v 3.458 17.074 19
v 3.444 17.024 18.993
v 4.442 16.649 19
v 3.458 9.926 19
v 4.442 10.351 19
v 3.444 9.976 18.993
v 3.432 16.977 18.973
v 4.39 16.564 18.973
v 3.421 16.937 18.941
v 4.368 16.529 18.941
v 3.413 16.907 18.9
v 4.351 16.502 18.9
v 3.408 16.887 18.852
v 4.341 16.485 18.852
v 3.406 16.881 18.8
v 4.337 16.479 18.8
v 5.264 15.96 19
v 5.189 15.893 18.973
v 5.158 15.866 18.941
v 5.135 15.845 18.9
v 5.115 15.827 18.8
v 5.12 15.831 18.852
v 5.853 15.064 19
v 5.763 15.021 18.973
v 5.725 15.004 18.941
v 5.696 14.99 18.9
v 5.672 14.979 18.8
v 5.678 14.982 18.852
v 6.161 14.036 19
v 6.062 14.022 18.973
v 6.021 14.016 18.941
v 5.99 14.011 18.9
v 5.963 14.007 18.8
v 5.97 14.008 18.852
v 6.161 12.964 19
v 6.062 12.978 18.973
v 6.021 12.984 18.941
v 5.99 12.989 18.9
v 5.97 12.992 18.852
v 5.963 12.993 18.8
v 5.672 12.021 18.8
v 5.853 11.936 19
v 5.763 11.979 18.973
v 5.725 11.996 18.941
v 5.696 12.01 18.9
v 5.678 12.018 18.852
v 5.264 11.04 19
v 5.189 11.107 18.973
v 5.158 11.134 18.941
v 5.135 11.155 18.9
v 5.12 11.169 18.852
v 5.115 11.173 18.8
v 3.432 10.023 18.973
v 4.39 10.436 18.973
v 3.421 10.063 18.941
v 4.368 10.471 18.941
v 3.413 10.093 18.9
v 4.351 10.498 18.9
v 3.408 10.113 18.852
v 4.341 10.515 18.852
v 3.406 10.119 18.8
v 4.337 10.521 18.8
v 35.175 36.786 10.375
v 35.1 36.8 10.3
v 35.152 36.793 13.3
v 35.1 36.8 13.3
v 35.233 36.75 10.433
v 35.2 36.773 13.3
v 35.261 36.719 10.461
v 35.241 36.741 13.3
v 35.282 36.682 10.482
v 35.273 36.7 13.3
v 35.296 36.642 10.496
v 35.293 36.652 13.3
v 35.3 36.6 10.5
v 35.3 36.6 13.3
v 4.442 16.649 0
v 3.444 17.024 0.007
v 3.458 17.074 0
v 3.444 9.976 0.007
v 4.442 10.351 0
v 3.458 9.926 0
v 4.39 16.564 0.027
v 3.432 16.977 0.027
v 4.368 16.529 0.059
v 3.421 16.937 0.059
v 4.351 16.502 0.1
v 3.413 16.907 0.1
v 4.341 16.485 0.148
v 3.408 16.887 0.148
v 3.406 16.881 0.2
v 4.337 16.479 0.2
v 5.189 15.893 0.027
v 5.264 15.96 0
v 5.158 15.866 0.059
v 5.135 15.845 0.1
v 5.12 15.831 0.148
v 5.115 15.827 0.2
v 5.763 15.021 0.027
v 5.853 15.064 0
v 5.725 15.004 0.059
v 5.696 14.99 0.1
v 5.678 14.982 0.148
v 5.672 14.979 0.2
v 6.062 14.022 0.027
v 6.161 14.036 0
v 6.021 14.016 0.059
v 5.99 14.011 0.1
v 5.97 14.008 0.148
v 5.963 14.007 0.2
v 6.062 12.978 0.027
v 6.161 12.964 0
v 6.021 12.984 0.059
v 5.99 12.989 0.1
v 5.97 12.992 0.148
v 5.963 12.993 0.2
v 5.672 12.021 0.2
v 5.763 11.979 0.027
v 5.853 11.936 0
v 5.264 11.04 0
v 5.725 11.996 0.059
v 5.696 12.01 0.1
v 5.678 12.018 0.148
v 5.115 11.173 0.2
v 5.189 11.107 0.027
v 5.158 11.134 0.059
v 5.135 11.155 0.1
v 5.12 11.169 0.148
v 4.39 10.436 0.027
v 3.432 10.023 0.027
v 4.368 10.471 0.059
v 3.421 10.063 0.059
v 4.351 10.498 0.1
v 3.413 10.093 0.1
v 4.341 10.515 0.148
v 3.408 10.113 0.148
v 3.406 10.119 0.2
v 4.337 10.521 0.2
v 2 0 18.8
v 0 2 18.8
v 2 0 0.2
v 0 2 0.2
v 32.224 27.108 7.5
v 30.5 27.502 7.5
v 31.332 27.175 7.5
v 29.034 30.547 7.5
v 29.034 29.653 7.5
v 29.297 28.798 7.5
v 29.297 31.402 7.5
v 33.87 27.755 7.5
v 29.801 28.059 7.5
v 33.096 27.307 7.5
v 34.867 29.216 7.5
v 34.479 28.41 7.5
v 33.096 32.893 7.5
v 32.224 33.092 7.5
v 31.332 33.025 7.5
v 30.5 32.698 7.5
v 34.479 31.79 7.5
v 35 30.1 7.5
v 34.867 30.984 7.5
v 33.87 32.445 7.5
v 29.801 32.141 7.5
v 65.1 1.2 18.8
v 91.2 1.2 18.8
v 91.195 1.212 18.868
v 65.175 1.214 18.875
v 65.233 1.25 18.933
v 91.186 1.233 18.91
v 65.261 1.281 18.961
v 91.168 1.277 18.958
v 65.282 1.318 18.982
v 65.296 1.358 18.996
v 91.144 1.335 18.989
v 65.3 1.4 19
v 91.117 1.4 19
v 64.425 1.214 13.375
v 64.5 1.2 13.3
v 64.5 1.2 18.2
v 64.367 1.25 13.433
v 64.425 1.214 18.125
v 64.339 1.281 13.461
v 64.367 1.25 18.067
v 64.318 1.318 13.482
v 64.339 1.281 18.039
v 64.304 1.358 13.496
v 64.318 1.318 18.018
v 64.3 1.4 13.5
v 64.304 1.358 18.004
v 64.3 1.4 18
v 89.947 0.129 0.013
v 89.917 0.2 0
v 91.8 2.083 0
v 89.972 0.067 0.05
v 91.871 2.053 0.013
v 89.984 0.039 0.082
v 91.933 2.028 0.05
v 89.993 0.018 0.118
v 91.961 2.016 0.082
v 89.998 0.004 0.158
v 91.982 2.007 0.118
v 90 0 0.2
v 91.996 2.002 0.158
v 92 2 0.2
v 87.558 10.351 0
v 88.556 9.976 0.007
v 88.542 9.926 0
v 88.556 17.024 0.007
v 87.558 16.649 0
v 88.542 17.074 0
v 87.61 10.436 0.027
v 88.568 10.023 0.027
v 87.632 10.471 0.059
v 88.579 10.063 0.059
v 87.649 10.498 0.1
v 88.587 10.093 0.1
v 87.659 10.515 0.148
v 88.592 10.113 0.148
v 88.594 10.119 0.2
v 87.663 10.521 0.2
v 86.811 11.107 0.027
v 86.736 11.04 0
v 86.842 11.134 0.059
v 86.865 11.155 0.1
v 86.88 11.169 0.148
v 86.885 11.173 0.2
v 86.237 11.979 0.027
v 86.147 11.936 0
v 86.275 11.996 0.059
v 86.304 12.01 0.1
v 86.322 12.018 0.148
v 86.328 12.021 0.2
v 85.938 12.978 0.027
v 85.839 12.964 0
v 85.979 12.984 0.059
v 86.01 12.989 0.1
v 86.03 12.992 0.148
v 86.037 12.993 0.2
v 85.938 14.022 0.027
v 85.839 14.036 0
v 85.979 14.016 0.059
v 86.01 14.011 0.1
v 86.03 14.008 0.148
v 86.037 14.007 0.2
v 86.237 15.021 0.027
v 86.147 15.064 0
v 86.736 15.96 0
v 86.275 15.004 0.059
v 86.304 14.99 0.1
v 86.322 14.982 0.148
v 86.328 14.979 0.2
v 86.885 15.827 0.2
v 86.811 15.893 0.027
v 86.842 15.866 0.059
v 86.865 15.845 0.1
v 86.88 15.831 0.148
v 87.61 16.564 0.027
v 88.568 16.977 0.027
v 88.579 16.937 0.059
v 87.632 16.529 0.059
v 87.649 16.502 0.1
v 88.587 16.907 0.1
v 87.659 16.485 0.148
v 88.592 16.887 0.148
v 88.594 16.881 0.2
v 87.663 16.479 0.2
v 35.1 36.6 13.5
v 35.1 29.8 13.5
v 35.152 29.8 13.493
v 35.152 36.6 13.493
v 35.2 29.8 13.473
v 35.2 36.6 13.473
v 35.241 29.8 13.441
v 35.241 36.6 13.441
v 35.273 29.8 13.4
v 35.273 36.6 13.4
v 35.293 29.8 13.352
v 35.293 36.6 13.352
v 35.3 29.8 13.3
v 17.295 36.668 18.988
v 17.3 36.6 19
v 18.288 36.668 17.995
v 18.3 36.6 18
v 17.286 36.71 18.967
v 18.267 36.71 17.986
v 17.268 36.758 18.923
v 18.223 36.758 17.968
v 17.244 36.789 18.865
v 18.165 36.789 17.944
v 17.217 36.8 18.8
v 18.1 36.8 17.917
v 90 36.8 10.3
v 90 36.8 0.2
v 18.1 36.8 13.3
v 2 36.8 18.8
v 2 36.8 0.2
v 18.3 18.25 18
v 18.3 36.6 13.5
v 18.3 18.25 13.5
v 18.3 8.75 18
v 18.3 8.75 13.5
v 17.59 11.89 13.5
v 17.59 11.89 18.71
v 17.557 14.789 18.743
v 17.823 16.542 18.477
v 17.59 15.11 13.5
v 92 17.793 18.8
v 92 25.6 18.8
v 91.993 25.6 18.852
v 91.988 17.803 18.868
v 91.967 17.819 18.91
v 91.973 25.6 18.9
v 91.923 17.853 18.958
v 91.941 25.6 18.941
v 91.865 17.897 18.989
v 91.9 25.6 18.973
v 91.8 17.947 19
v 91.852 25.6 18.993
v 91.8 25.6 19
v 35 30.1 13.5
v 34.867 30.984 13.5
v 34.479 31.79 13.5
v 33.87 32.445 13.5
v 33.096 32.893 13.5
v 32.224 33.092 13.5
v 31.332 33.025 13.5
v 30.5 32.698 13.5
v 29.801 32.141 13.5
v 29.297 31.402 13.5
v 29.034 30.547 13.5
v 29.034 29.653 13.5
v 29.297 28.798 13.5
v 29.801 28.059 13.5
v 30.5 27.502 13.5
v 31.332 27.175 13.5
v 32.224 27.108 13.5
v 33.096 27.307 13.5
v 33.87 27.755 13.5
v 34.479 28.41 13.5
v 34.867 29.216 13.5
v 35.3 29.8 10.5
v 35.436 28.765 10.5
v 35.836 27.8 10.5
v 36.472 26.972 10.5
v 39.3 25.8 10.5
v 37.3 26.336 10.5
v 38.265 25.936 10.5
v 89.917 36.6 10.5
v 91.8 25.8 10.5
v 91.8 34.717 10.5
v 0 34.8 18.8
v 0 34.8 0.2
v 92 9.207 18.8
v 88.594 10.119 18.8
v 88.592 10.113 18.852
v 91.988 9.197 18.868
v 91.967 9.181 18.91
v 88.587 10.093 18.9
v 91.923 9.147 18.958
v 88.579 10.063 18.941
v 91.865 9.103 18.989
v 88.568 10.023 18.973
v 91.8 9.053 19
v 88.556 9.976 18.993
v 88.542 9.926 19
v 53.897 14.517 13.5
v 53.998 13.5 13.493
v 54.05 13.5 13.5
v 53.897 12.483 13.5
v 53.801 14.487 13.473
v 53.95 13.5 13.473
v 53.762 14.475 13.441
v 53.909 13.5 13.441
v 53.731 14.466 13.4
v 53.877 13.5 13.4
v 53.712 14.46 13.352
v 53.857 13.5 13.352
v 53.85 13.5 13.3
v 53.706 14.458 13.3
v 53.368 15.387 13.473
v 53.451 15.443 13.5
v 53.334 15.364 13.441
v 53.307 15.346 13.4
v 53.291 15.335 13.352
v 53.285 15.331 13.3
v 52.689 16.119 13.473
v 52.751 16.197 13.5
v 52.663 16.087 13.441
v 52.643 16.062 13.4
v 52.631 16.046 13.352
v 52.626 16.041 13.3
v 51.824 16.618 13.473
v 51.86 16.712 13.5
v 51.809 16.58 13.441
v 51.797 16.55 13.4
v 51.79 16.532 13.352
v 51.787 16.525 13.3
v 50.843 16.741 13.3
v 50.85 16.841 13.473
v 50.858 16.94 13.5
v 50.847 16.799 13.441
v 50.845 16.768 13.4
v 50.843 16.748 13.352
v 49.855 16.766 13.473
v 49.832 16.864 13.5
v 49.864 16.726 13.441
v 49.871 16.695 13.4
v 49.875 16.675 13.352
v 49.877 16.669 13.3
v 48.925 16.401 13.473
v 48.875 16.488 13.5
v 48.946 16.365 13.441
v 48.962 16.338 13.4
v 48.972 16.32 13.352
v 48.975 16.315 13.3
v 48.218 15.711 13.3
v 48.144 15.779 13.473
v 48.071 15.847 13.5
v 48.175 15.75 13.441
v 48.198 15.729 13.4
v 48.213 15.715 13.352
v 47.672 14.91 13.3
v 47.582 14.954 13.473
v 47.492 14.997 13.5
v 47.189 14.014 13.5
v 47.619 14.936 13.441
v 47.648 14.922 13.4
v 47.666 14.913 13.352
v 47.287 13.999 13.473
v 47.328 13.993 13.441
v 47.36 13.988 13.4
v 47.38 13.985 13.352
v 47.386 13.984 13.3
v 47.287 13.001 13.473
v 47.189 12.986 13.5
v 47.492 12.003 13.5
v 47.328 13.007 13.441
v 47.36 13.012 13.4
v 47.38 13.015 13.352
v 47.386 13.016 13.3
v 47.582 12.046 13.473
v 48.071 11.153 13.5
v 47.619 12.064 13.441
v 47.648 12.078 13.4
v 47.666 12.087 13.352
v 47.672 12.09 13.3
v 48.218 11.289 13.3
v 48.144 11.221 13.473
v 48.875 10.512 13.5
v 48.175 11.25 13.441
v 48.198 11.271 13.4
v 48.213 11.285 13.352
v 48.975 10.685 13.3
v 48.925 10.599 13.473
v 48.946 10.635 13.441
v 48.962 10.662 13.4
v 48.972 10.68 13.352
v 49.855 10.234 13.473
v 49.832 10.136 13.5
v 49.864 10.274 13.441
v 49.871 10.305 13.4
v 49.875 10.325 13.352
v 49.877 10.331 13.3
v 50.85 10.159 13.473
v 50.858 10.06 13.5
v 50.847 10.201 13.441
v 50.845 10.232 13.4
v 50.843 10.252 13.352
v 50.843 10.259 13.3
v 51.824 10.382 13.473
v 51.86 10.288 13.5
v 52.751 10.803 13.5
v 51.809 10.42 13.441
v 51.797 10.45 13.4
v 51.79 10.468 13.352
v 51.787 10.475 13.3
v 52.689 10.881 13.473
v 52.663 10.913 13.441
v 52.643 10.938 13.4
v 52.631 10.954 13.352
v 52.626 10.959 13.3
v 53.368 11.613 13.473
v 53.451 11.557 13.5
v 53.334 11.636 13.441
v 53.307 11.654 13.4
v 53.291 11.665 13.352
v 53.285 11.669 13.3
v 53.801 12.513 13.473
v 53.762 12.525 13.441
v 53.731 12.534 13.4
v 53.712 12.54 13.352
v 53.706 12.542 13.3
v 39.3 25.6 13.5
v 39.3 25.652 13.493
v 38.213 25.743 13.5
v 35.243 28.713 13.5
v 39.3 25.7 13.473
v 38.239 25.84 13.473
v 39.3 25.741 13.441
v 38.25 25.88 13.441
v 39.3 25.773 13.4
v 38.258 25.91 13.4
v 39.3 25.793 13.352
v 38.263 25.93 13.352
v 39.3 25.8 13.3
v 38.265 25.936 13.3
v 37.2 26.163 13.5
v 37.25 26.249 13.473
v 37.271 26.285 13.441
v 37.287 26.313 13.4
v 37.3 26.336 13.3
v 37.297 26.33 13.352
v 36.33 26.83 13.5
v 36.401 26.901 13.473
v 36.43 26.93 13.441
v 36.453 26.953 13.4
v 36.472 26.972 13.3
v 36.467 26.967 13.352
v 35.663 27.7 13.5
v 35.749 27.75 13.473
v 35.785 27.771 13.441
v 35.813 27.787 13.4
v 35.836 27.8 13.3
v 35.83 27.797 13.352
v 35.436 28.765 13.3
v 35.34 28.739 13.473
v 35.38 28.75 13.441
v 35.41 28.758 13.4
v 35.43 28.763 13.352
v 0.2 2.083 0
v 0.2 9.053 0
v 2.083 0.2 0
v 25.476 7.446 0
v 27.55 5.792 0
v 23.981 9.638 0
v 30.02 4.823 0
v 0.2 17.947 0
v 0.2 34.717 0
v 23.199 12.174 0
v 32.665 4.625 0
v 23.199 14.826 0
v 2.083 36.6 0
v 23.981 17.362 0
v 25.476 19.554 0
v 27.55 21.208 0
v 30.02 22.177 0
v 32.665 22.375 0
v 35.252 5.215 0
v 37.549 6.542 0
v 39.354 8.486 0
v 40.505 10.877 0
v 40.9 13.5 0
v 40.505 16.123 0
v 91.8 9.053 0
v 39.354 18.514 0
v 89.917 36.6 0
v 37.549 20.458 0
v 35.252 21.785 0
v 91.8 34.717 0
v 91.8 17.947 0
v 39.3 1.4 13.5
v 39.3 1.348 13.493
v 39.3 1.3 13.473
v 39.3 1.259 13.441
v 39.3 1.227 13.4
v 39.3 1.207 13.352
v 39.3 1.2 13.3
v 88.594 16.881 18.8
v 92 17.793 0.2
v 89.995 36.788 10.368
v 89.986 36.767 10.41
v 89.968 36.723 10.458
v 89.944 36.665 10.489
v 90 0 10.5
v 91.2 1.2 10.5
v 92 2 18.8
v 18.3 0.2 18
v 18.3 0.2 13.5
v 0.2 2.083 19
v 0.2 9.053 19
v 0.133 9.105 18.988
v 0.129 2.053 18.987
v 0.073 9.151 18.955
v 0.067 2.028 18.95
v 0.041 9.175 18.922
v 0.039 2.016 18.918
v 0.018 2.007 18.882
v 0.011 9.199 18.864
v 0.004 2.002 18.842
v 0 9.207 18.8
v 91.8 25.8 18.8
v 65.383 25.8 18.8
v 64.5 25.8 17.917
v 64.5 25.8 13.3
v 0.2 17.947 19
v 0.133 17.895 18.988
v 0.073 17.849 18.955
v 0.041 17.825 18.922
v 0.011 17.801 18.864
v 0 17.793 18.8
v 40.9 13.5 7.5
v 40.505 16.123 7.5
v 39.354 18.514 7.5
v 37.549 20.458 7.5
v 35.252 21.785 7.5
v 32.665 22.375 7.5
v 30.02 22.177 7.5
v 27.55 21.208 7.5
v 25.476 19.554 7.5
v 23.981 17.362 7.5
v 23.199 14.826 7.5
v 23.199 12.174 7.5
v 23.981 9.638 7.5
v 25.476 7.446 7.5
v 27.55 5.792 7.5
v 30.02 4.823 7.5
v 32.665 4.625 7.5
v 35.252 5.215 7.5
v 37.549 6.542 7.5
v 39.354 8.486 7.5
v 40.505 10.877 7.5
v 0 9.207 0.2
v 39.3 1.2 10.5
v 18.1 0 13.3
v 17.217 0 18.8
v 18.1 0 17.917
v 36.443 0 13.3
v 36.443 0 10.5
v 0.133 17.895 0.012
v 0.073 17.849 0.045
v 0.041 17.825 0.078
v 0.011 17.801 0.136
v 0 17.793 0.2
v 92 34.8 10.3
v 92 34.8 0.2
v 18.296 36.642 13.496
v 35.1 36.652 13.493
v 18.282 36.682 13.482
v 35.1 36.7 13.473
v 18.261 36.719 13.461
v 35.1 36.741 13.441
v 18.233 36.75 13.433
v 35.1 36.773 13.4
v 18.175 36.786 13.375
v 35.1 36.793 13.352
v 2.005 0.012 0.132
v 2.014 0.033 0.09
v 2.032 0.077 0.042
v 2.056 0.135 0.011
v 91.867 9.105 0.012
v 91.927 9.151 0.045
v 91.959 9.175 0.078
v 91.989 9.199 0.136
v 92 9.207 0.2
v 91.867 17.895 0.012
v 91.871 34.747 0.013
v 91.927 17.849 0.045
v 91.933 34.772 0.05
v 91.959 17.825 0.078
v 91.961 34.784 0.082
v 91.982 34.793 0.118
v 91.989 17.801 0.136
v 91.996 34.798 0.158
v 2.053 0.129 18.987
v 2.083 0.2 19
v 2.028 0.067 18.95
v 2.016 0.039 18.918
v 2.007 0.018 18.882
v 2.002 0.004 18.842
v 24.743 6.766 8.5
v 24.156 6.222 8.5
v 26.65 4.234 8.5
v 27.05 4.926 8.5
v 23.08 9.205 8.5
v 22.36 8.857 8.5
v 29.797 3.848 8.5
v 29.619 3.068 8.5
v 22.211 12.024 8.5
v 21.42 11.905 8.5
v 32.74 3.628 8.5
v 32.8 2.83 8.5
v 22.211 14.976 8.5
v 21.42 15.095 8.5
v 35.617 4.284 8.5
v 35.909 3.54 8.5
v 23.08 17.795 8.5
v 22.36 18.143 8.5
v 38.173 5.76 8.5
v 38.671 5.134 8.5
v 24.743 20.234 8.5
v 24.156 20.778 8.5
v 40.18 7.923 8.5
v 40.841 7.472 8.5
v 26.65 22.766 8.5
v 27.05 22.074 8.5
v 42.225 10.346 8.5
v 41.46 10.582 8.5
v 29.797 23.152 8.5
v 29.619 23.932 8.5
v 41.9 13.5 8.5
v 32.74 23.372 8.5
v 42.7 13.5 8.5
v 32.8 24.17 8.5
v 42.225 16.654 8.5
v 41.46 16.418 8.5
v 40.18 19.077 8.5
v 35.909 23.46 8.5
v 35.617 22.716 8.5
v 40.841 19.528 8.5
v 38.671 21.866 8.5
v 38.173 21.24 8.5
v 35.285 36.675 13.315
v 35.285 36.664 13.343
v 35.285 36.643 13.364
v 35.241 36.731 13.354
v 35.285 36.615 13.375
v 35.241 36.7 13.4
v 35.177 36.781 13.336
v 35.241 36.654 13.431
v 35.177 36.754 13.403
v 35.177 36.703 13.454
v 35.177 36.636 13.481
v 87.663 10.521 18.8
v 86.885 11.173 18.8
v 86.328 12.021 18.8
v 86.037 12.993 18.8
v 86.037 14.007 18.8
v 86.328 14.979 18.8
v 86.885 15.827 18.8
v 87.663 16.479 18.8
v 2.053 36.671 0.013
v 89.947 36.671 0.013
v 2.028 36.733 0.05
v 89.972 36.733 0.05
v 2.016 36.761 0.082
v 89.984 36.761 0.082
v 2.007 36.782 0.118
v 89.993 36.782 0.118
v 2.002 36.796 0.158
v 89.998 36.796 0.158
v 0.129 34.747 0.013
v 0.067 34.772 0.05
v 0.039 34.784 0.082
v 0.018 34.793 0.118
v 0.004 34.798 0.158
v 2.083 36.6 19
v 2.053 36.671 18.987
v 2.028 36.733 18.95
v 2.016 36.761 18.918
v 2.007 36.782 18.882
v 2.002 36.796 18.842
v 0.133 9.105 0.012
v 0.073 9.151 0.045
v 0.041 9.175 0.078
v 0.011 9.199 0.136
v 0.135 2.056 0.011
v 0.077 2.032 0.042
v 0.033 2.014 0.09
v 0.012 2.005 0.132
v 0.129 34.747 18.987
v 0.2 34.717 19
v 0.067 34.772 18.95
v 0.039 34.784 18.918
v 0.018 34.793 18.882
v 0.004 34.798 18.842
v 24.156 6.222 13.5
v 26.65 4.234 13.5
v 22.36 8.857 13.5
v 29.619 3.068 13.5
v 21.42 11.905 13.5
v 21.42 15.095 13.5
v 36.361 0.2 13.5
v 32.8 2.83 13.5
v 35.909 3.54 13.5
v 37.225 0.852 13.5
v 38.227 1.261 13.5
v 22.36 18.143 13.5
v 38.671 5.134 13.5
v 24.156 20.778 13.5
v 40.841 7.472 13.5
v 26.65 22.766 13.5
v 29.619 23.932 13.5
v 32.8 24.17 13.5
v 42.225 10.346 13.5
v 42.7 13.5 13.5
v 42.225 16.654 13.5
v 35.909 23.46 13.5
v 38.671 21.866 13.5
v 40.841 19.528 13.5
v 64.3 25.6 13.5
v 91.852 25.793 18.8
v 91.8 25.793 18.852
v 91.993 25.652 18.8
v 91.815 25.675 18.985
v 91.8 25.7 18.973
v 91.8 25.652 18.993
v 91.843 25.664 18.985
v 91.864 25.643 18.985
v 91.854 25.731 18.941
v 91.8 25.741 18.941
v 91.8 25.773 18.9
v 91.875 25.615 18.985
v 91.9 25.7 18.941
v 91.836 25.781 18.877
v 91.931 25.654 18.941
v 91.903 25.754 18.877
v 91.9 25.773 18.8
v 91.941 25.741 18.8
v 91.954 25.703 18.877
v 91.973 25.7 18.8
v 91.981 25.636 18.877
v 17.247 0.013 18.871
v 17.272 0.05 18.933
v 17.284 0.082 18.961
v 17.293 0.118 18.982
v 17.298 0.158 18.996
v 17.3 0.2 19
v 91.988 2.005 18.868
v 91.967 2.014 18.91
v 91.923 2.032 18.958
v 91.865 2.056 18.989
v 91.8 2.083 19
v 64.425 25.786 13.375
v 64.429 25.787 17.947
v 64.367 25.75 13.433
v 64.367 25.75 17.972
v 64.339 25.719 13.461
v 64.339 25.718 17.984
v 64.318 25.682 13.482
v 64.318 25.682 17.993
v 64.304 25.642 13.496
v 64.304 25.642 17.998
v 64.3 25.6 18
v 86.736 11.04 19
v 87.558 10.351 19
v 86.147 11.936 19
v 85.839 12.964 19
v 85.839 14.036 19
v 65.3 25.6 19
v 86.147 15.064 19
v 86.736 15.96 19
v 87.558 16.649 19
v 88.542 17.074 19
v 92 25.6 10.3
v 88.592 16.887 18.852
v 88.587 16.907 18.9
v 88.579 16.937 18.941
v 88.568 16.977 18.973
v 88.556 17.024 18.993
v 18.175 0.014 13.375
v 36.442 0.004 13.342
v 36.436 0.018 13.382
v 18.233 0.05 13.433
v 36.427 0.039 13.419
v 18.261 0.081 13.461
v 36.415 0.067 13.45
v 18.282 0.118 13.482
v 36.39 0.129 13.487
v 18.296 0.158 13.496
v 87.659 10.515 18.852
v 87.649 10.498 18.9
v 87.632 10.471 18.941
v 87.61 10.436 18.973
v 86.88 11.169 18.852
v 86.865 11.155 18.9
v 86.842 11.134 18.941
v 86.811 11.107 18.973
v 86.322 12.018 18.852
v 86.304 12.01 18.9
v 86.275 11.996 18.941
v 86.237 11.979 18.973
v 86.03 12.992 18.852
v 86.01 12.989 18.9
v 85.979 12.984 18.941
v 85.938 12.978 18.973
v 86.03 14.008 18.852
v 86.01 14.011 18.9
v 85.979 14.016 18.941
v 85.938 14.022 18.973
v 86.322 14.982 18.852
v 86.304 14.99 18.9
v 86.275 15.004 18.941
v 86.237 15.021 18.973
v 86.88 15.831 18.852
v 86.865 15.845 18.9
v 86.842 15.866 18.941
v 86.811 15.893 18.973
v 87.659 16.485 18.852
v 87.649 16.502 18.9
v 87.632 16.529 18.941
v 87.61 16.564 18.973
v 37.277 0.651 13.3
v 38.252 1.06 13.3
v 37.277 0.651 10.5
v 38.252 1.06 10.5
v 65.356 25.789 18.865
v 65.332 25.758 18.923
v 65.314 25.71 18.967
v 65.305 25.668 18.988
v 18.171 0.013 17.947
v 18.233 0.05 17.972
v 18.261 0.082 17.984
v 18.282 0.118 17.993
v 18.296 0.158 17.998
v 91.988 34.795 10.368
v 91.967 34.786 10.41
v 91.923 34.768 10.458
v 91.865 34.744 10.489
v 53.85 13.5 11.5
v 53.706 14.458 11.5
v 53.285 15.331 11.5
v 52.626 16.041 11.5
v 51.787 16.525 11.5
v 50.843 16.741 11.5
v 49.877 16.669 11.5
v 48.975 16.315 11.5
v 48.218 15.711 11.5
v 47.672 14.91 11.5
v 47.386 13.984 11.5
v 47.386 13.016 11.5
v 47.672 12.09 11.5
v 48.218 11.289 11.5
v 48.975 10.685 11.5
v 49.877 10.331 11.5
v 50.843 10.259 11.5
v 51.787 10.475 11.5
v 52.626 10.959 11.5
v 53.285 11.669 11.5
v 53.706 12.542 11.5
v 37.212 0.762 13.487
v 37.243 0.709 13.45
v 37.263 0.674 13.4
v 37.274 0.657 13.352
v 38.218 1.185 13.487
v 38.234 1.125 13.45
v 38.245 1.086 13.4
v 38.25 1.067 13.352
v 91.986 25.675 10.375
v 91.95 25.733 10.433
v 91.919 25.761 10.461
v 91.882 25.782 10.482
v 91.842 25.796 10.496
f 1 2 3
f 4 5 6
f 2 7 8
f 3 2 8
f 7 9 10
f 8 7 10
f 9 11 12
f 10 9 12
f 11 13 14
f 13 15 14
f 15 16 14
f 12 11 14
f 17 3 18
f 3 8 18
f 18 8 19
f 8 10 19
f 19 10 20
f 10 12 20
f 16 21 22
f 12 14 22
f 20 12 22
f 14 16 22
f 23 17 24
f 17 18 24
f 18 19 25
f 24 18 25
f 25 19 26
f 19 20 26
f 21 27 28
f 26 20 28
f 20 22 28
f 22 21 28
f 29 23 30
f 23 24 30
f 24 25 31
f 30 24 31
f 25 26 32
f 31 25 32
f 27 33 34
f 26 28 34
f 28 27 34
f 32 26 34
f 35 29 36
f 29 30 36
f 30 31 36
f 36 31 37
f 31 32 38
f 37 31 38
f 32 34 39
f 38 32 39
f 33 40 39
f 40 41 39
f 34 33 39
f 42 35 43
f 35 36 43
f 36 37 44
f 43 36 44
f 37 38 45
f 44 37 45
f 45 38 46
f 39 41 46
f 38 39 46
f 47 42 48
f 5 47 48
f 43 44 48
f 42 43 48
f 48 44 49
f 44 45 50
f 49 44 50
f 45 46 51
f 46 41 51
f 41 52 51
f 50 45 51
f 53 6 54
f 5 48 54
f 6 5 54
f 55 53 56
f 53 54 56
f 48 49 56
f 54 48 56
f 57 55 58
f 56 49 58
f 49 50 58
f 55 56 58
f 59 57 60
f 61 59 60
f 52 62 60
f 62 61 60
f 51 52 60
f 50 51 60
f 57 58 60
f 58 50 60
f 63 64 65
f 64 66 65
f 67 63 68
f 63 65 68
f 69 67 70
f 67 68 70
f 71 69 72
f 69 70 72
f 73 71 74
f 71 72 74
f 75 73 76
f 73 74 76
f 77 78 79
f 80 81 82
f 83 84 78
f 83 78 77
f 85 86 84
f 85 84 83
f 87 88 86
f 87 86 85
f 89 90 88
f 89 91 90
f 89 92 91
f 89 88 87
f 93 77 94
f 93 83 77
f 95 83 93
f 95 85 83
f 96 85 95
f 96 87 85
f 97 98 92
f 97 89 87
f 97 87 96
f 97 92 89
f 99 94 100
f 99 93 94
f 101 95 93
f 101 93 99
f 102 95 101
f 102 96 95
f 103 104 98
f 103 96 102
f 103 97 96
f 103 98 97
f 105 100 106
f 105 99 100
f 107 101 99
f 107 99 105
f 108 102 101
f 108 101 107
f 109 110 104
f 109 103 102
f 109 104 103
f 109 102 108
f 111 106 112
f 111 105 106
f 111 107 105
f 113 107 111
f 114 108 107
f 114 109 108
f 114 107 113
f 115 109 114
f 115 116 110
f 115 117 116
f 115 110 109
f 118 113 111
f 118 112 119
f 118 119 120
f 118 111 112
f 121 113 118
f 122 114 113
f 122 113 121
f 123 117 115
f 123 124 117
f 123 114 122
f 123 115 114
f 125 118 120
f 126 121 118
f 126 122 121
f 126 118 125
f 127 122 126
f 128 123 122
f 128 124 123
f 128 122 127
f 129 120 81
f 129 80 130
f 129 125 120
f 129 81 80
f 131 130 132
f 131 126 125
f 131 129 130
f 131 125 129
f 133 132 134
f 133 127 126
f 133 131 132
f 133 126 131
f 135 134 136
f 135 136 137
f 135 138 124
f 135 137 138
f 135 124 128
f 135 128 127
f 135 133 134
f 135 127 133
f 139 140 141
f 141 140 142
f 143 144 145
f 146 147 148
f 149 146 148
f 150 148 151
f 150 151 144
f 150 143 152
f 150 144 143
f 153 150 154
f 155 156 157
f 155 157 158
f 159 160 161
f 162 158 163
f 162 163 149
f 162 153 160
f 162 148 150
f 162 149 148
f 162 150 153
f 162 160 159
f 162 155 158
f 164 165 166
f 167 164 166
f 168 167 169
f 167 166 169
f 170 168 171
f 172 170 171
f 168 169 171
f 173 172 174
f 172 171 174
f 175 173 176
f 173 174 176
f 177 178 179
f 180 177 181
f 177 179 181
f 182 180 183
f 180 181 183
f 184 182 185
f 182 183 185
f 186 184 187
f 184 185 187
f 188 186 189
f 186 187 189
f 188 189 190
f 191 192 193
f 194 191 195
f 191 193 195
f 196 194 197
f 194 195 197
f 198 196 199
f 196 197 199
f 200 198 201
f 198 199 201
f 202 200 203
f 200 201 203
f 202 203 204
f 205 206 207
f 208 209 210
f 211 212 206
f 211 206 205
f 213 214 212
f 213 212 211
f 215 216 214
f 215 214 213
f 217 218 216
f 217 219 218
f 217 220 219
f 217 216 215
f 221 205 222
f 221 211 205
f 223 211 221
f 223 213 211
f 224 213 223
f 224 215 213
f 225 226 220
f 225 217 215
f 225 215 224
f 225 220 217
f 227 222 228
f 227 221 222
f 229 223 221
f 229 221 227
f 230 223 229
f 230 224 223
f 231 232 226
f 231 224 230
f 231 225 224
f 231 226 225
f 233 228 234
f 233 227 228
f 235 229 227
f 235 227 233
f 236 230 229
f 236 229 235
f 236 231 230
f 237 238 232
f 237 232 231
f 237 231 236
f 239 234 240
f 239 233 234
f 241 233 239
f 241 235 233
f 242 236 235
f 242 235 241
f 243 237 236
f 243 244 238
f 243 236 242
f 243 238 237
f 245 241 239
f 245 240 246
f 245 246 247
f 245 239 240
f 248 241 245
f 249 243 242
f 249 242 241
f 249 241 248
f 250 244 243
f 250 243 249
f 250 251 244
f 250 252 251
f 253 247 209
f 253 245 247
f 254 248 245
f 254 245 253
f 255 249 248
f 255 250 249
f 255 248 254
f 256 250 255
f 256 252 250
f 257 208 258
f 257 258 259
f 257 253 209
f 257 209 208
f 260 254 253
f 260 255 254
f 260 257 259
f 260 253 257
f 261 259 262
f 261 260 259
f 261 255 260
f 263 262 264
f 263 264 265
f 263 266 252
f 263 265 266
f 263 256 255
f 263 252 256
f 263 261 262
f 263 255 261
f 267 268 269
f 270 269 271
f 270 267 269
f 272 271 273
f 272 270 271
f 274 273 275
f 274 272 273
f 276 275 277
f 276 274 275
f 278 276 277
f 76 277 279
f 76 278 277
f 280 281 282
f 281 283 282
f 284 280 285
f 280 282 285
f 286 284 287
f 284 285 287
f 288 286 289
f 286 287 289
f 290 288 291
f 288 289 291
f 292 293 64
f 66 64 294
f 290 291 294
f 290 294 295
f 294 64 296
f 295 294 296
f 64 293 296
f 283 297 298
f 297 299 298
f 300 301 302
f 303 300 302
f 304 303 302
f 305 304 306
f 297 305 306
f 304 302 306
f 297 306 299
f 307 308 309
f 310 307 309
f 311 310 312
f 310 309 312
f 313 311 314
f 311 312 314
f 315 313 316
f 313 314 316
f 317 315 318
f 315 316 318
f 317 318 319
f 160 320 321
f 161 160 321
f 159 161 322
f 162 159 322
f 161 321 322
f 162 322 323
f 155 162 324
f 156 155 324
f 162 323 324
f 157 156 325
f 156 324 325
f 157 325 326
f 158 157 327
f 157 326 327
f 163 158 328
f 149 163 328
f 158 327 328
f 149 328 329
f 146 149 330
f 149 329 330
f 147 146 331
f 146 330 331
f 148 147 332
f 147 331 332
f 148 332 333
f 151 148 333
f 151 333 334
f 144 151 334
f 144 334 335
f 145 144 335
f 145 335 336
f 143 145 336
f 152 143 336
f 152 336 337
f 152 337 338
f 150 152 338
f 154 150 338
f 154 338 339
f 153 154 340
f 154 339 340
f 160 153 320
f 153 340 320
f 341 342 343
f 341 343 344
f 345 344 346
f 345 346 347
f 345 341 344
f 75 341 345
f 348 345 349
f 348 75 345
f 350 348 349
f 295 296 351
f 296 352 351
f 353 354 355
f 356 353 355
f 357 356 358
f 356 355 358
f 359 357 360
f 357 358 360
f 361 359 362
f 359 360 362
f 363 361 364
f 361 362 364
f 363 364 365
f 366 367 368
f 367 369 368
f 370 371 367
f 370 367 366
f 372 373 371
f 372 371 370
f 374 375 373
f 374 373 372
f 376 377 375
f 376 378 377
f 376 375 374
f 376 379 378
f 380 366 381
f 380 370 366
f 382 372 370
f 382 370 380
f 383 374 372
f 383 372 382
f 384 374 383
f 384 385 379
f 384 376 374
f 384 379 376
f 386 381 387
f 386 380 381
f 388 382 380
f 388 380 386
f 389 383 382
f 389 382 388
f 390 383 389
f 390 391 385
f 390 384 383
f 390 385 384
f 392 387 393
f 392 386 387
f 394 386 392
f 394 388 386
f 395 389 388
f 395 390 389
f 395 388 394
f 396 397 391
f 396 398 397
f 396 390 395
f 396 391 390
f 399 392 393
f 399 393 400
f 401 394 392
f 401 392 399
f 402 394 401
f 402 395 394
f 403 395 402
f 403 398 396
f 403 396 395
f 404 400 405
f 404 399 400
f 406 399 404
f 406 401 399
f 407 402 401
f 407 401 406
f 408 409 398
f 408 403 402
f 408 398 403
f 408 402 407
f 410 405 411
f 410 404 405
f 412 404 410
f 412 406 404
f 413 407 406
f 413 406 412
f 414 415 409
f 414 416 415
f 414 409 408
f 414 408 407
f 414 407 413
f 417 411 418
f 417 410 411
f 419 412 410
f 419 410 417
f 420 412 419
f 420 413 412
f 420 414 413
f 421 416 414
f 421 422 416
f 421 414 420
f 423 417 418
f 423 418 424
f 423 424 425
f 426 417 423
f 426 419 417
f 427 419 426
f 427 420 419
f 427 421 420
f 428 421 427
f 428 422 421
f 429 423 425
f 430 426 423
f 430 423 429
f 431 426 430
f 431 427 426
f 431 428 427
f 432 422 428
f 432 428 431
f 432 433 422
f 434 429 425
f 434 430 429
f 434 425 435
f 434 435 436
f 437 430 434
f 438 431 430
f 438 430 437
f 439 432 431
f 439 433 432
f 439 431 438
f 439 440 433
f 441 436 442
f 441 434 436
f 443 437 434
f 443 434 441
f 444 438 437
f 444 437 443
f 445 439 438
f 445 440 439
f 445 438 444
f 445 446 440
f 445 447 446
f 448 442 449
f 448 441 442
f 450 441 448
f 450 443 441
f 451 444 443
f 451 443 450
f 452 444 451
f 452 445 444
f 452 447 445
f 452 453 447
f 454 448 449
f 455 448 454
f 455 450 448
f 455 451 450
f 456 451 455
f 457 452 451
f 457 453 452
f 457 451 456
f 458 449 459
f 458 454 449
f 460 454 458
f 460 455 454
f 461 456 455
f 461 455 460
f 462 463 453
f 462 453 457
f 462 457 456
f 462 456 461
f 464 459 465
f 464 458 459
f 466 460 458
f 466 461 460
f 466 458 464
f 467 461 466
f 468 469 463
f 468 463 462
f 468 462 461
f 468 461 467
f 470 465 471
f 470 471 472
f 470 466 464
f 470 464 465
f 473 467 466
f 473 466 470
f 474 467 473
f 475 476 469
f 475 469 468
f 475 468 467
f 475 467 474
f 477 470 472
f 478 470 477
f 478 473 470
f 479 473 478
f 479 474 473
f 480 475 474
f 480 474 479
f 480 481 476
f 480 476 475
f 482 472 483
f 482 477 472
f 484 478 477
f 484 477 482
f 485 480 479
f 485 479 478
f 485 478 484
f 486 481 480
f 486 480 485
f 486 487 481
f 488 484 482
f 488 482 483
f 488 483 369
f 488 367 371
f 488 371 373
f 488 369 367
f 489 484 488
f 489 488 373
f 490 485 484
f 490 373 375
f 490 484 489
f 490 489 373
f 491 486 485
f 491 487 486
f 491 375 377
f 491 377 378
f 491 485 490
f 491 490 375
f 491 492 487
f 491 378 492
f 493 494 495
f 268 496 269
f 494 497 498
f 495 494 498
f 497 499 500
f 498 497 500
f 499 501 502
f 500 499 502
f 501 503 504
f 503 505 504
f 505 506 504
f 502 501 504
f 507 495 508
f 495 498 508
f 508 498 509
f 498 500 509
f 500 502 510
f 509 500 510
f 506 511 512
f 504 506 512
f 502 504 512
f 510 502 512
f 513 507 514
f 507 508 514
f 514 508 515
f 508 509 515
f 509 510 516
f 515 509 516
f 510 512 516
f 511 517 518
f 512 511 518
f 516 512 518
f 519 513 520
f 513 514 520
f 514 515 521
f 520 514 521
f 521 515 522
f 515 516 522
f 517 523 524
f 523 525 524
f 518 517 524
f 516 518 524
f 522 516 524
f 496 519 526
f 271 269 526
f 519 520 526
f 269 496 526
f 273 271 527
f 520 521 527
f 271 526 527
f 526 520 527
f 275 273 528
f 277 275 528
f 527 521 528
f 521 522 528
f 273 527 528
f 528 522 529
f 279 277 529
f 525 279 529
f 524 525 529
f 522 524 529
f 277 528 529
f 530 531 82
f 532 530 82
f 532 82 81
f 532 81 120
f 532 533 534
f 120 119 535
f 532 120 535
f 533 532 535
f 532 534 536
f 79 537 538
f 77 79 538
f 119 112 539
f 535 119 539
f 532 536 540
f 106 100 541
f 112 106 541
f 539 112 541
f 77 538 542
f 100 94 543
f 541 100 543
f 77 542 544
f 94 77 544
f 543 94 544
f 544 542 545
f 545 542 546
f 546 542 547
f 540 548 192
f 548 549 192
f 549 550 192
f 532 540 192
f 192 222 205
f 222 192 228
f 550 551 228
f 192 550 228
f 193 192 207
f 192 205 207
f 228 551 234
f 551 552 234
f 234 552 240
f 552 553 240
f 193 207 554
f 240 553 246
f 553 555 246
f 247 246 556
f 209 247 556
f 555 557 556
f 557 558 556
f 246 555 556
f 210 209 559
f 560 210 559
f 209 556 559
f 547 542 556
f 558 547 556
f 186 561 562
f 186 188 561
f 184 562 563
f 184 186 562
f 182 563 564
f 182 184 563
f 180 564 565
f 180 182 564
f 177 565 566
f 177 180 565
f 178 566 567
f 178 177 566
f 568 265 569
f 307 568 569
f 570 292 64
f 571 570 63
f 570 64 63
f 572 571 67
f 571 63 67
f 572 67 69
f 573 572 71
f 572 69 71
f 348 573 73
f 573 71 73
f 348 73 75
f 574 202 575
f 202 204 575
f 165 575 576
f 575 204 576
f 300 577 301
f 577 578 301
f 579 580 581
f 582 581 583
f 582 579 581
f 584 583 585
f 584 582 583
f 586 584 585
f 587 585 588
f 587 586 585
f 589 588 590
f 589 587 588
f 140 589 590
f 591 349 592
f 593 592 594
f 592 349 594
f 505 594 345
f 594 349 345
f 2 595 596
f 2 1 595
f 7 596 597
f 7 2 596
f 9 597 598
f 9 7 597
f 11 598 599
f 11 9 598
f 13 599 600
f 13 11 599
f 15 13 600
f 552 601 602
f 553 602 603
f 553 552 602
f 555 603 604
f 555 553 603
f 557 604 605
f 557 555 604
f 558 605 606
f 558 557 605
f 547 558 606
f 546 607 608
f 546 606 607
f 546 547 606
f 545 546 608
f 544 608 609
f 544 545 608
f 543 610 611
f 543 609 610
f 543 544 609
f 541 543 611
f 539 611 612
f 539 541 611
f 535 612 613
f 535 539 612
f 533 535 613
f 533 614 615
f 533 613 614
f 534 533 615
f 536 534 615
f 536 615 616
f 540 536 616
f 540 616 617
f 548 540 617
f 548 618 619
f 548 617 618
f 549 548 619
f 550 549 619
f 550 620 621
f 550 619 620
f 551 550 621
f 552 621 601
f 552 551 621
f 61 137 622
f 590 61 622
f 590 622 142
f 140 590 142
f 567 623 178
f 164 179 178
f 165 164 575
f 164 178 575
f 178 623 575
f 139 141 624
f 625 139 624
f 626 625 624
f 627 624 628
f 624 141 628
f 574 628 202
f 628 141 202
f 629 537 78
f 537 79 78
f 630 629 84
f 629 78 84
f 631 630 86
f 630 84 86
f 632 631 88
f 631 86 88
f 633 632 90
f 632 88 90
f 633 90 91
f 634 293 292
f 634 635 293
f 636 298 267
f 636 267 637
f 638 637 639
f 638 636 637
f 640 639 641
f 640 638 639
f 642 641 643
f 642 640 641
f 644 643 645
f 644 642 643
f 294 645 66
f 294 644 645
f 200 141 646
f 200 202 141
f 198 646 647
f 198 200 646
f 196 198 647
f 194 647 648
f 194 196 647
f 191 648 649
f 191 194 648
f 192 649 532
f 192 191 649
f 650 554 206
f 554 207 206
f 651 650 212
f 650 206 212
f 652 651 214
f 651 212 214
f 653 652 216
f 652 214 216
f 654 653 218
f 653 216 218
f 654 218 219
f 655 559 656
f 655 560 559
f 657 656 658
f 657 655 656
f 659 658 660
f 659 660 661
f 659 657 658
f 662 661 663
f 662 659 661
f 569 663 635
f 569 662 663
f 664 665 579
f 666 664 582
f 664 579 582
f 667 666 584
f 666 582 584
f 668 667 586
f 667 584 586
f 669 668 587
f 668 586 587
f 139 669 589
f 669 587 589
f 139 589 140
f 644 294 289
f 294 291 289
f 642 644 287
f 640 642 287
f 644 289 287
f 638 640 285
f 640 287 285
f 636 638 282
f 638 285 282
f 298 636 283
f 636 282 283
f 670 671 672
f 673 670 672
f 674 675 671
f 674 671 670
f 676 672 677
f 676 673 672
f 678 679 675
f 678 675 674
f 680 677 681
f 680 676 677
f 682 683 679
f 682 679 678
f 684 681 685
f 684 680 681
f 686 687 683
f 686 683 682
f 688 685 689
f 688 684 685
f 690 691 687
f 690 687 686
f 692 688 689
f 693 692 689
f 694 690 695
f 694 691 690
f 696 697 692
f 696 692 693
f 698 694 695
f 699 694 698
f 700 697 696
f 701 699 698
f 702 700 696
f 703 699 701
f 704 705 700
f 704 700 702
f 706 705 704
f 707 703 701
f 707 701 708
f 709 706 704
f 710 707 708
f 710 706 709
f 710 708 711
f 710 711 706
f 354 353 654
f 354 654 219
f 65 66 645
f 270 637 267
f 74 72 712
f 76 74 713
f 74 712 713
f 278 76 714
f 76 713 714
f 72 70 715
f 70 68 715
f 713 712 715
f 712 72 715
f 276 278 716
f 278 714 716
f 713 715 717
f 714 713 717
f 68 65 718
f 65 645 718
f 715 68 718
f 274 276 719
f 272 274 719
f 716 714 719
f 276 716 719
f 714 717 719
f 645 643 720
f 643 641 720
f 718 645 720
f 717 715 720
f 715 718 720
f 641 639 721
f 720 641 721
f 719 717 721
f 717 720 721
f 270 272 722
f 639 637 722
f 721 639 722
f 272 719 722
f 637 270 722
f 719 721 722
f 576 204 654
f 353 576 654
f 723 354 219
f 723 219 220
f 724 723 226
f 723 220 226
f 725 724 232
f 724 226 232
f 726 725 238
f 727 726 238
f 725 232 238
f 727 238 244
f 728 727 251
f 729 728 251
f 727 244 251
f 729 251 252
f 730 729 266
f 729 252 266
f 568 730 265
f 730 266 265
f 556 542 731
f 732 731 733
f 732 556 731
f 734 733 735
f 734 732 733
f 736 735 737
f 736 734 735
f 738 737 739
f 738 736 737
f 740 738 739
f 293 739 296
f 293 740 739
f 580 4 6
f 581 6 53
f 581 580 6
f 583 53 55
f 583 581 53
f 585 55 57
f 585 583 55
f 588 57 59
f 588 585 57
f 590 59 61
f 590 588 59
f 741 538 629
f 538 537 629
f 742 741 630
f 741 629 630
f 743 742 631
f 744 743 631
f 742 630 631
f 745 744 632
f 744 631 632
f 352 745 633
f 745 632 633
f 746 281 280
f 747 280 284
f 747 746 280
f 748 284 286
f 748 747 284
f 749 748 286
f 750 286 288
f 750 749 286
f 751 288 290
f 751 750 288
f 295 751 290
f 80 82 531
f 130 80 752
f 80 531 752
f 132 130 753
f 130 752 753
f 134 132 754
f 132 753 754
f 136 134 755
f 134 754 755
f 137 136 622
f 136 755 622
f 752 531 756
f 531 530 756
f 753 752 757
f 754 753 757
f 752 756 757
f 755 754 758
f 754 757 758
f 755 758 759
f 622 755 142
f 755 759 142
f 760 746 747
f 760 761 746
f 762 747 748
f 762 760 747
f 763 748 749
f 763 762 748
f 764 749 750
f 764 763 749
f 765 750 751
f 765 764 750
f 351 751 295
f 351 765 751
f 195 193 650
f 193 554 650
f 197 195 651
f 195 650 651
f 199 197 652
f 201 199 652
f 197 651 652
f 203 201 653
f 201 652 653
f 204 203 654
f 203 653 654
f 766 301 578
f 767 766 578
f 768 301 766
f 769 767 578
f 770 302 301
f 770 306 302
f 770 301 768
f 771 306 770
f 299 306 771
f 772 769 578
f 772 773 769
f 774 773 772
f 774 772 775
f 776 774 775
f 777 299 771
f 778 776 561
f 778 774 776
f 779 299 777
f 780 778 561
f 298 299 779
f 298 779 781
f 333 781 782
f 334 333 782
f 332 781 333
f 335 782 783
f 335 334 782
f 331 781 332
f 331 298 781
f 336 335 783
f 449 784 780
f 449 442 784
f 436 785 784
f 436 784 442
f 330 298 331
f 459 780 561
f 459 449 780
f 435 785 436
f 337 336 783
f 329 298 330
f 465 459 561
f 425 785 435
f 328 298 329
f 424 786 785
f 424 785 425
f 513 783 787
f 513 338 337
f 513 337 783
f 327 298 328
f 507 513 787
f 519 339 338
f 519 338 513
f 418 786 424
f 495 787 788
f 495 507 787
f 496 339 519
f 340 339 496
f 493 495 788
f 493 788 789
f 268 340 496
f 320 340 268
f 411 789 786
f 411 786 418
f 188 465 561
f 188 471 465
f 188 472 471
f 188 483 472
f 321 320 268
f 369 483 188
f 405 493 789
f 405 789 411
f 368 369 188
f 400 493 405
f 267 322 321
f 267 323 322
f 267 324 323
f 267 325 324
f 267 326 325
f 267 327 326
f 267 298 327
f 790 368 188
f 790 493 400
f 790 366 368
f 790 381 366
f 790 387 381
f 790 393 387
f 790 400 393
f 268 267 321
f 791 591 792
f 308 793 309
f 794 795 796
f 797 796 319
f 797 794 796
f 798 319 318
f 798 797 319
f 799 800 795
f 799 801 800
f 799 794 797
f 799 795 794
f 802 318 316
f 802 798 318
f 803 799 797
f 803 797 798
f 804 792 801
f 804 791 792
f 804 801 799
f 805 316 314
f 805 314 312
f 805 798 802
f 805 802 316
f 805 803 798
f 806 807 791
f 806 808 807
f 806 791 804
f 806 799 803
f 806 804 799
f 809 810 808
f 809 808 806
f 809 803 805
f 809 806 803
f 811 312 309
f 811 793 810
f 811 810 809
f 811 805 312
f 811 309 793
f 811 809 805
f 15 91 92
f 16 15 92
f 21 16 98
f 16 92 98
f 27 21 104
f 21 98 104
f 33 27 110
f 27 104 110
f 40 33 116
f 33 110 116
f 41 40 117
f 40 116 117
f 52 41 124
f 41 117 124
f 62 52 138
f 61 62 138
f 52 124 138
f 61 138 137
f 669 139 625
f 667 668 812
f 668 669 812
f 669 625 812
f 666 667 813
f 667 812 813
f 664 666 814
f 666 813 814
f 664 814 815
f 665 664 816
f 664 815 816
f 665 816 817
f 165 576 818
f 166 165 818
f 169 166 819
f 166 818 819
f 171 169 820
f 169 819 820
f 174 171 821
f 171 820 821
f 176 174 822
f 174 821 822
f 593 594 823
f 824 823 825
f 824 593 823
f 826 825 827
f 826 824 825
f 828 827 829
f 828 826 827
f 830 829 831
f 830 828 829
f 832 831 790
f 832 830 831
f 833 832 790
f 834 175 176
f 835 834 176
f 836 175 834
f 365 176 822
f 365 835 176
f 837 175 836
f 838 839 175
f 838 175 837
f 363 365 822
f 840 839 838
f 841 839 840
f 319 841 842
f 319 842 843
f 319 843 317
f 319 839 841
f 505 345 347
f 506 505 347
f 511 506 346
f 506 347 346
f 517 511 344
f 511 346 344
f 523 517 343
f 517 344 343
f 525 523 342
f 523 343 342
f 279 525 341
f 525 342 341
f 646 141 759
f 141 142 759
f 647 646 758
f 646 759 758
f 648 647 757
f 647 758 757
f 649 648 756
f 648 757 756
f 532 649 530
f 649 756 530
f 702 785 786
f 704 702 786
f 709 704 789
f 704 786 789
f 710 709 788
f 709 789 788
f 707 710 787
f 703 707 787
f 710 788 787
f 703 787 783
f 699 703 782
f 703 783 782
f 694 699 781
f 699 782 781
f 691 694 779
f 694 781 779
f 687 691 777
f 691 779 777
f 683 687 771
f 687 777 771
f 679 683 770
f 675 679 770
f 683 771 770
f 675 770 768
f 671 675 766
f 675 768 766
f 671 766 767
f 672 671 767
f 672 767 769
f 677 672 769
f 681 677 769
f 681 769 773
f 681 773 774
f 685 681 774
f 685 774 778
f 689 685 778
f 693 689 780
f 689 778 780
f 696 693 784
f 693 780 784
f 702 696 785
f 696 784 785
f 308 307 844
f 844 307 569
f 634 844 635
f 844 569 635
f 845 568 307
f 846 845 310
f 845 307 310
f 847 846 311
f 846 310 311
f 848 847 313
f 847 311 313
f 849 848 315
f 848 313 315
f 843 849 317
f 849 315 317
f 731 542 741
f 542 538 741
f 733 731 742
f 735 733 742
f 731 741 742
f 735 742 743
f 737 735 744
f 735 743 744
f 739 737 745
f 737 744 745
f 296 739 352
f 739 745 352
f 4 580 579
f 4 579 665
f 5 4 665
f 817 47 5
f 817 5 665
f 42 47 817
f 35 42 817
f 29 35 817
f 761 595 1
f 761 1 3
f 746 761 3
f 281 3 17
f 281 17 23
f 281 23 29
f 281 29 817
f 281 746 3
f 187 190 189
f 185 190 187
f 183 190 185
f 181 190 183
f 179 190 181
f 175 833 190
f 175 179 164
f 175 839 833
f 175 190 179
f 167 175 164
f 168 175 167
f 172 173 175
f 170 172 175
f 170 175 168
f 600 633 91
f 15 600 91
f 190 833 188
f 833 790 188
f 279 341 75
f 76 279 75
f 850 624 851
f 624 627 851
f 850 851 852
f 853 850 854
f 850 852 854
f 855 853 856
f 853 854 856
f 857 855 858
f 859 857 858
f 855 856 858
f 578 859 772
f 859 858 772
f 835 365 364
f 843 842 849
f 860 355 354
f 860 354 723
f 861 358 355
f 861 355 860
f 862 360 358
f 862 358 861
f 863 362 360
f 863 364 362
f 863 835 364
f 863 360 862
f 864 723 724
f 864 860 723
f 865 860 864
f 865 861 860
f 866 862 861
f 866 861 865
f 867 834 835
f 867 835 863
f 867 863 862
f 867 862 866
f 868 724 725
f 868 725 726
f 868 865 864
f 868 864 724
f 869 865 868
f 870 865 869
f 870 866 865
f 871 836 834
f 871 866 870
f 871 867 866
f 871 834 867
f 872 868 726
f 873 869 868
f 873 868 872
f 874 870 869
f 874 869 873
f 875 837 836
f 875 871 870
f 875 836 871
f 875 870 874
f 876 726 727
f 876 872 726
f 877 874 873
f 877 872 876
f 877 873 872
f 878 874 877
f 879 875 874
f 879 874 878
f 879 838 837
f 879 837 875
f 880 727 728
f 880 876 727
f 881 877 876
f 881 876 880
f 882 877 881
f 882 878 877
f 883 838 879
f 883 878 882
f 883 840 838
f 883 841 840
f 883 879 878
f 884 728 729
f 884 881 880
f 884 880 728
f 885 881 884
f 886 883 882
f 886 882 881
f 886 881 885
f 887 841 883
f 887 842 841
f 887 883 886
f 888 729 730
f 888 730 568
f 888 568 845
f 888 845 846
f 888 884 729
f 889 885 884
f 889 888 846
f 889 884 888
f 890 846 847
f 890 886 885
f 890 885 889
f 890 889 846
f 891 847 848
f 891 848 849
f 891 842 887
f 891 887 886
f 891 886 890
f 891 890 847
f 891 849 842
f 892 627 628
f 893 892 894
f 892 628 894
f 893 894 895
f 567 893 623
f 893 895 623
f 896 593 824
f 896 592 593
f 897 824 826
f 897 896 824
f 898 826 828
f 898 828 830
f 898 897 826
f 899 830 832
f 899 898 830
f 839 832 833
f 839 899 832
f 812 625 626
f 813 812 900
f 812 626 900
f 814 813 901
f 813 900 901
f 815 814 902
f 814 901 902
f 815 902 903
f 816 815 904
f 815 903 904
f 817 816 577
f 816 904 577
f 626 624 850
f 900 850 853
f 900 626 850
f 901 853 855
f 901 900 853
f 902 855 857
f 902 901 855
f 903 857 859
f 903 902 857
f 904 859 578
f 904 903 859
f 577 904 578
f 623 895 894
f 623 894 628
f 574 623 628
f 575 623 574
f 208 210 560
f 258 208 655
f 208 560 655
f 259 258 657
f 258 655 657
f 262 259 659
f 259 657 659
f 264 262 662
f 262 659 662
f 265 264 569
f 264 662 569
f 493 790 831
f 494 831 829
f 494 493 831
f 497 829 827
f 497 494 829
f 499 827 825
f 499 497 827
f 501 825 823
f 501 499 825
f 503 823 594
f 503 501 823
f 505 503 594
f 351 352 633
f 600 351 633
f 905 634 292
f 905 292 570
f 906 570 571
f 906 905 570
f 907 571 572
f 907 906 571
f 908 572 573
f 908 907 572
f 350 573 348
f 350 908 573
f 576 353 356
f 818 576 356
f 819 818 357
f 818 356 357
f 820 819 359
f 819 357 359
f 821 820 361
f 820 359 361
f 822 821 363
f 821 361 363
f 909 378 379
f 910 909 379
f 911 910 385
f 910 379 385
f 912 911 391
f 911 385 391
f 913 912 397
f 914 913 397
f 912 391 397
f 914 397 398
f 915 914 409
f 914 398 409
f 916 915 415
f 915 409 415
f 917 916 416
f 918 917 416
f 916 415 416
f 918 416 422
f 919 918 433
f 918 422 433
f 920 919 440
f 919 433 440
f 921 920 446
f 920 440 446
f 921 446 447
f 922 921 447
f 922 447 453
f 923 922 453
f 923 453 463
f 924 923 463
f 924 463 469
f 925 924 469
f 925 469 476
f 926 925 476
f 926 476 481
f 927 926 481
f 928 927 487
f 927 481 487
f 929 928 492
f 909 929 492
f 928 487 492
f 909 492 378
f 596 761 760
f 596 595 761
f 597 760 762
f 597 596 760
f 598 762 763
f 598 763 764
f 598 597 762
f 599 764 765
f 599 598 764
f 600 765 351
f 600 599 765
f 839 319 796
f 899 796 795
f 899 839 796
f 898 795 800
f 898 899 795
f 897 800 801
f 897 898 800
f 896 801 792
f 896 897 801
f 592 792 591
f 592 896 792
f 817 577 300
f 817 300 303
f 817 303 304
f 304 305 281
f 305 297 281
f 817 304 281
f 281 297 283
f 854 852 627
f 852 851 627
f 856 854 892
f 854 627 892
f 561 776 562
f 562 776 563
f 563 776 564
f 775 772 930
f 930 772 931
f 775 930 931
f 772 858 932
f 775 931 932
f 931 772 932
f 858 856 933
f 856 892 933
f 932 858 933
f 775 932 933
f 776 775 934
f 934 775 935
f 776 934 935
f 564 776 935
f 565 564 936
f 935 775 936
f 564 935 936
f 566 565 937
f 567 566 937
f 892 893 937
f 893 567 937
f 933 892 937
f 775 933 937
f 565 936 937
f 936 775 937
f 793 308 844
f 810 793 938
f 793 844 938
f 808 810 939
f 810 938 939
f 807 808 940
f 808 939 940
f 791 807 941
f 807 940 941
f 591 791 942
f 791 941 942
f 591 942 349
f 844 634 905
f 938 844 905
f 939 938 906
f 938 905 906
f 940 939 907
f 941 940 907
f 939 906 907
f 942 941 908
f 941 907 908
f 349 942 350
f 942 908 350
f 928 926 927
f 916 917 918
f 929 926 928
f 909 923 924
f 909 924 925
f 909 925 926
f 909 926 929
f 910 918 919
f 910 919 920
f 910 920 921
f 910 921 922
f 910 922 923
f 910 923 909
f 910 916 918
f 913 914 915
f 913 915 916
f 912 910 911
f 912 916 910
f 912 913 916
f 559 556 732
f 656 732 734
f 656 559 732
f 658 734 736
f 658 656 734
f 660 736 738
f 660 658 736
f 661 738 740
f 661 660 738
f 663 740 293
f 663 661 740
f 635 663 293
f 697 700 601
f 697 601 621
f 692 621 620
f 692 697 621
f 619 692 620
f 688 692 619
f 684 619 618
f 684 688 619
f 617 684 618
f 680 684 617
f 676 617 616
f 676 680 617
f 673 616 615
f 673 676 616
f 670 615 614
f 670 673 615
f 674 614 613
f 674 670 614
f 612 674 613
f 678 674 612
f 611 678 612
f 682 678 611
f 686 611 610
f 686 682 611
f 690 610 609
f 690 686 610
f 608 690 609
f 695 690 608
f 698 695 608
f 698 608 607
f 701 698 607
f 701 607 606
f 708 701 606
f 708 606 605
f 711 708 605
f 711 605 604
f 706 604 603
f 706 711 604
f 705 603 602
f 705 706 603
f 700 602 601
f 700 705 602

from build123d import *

# Parameters (mm, degrees)
F0_R     = 8.9
F3_DEPTH = 13.5
F0_W     = 27.7
F0_H     = 1.2
F0_H_2   = 11
F4_DEPTH = 10.5
F2_R     = 10.7
F5_DEPTH = 5
F2_R_2   = 3.25
F6_DEPTH = 2
F2_R_3   = 3
F7_DEPTH = 6
F8_DEPTH = 5.5
F9_SIZE  = 1
F10_SIZE = 2
F11_R    = 0.2


with BuildPart() as f3:
    # F0 (on Top) → F3 (new body)
    with BuildSketch(Plane.XY):
        with BuildLine():
            Line((0, 9.2066603875), (0, 0))
            Line((0, 0), (18.3, 0))
            Line((18.3, 0), (18.3, 8.7502631652))
            ThreePointArc((18.3, 8.7502631652), (17.5, 13.5), (18.3, 18.2497368348))
            Line((18.3, 18.2497368348), (18.3, 36.8))
            Line((18.3, 36.8), (0, 36.8))
            Line((0, 36.8), (0, 17.7933396125))
            Line((0, 17.7933396125), (3.4058666579, 16.880740392))
            ThreePointArc((3.4058666579, 16.880740392), (6, 13.5), (3.4058666579, 10.119259608))
            Line((3.4058666579, 10.119259608), (0, 9.2066603875))
        make_face()
        with BuildLine():
            Line((18.3, 8.7502631652), (18.3, 0))
            Line((18.3, 0), (36.4434286286, 0))
            ThreePointArc((36.4434286286, 0), (37.7508066615, 0.8878177829), (39.3, 1.2))
            Line((39.3, 1.2), (64.3, 1.2))
            Line((64.3, 1.2), (64.3, 25.8))
            Line((64.3, 25.8), (39.3, 25.8))
            ThreePointArc((39.3, 25.8), (36.4715728753, 26.9715728753), (35.3, 29.8))
            Line((35.3, 29.8), (35.3, 36.8))
            Line((35.3, 36.8), (18.3, 36.8))
            Line((18.3, 36.8), (18.3, 18.2497368348))
            ThreePointArc((18.3, 18.2497368348), (17.5, 13.5), (18.3, 8.7502631652))
        make_face()
        with Locations((32, 13.5)):
            Circle(F0_R, mode=Mode.SUBTRACT)
        with BuildLine():
            Line((64.3, 25.8), (64.3, 1.2))
            Line((64.3, 1.2), (92, 1.2))
            Line((92, 1.2), (92, 9.2066603875))
            Line((92, 9.2066603875), (88.5941333421, 10.119259608))
            ThreePointArc((88.5941333421, 10.119259608), (86, 13.5), (88.5941333421, 16.880740392))
            Line((88.5941333421, 16.880740392), (92, 17.7933396125))
            Line((92, 17.7933396125), (92, 25.8))
            Line((92, 25.8), (64.3, 25.8))
        make_face()
    extrude(amount=F3_DEPTH)

    # F0 (on Top) → F4 (join)
    with BuildSketch(Plane.XY):
        with Locations((78.15, 0.6)):
            Rectangle(F0_W, F0_H)
        with BuildLine():
            ThreePointArc((39.3, 1.2), (37.7508066615, 0.8878177829), (36.4434286286, 0))
            Line((36.4434286286, 0), (64.3, 0))
            Line((64.3, 0), (64.3, 1.2))
            Line((64.3, 1.2), (39.3, 1.2))
        make_face()
        with BuildLine():
            Line((39.3, 25.8), (64.3, 25.8))
            Line((64.3, 25.8), (64.3, 36.8))
            Line((64.3, 36.8), (35.3, 36.8))
            Line((35.3, 36.8), (35.3, 29.8))
            ThreePointArc((35.3, 29.8), (36.4715728753, 26.9715728753), (39.3, 25.8))
        make_face()
        with Locations((78.15, 31.3)):
            Rectangle(F0_W, F0_H_2)
    extrude(amount=F4_DEPTH)

    # F2 (on offset) → F5 (cut)
    with BuildSketch(Plane.XY.offset(13.5)):
        with Locations((32, 13.5)):
            Circle(F2_R)
    extrude(amount=-F5_DEPTH, mode=Mode.SUBTRACT)

    # F2 (on offset) → F6 (cut)
    with BuildSketch(Plane.XY.offset(13.5)):
        with Locations((50.6, 13.5)):
            Circle(F2_R_2)
    extrude(amount=-F6_DEPTH, mode=Mode.SUBTRACT)

    # F2 (on offset) → F7 (cut)
    with BuildSketch(Plane.XY.offset(13.5)):
        with Locations((32, 30.1)):
            Circle(F2_R_3)
    extrude(amount=-F7_DEPTH, mode=Mode.SUBTRACT)

    # F2 (on offset) → F8 (join)
    with BuildSketch(Plane.XY.offset(13.5)):
        with BuildLine():
            Line((18.3, 0), (18.3, 8.7502631652))
            ThreePointArc((18.3, 8.7502631652), (17.5, 13.5), (18.3, 18.2497368348))
            Line((18.3, 18.2497368348), (18.3, 36.8))
            Line((18.3, 36.8), (0, 36.8))
            Line((0, 36.8), (0, 17.7933396125))
            Line((0, 17.7933396125), (3.4058666579, 16.880740392))
            ThreePointArc((3.4058666579, 16.880740392), (6, 13.5), (3.4058666579, 10.119259608))
            Line((3.4058666579, 10.119259608), (0, 9.2066603875))
            Line((0, 9.2066603875), (0, 0))
            Line((0, 0), (18.3, 0))
        make_face()
        with BuildLine():
            Line((92, 17.7933396125), (92, 25.8))
            Line((92, 25.8), (64.3, 25.8))
            Line((64.3, 25.8), (64.3, 1.2))
            Line((64.3, 1.2), (92, 1.2))
            Line((92, 1.2), (92, 9.2066603875))
            Line((92, 9.2066603875), (88.5941333421, 10.119259608))
            ThreePointArc((88.5941333421, 10.119259608), (86, 13.5), (88.5941333421, 16.880740392))
            Line((88.5941333421, 16.880740392), (92, 17.7933396125))
        make_face()
    extrude(amount=F8_DEPTH)

    # F9
    f9_edges = [f3.edges().sort_by_distance(p)[0] for p in [
        (23.1, 13.5, 8.5),
        (18.3, 27.524868, 19),
        (64.3, 13.5, 19),
    ]]
    chamfer(f9_edges, length=F9_SIZE)

    # F10
    f10_edges = [f3.edges().sort_by_distance(p)[0] for p in [
        (92, 0, 5.25),
        (92, 36.8, 5.25),
        (0, 36.8, 9.5),
        (0, 0, 9.5),
    ]]
    chamfer(f10_edges, length=F10_SIZE)

    # F11
    f11_edges = [f3.edges().sort_by_distance(p)[0] for p in [
        (1, 1, 19),
        (0, 5.60333, 19),
        (1.702933, 9.66296, 19),
        (6, 13.5, 19),
        (0, 26.29667, 19),
        (1.702933, 17.33704, 19),
        (1, 35.8, 19),
        (9.65, 36.8, 19),
        (17.8, 36.8, 18.5),
        (18.3, 36.8, 15.75),
        (26.8, 36.8, 13.5),
        (35.3, 36.8, 12),
        (62.65, 36.8, 10.5),
        (91, 35.8, 10.5),
        (92, 30.3, 10.5),
        (92, 25.8, 14.75),
        (78.65, 25.8, 19),
        (78.25, 1.2, 19),
        (91.6, 1.6, 19),
        (92, 5.60333, 19),
        (90.297067, 9.66296, 19),
        (86, 13.5, 19),
        (92, 21.79667, 19),
        (64.3, 1.2, 15.75),
        (51.8, 1.2, 13.5),
        (27.371714, 0, 13.5),
        (18.3, 0, 15.75),
        (17.8, 0, 18.5),
        (9.65, 0, 19),
        (64.3, 25.8, 15.75),
        (64.8, 25.8, 18.5),
        (51.8, 25.8, 13.5),
        (36.471573, 26.971573, 13.5),
        (35.3, 33.3, 13.5),
        (46, 36.8, 0),
        (91, 35.8, 0),
        (92, 26.29667, 0),
        (90.297067, 17.33704, 0),
        (86, 13.5, 0),
        (92, 5.60333, 0),
        (91, 1, 0),
        (46, 0, 0),
        (1, 1, 0),
        (0, 5.60333, 0),
        (1.702933, 9.66296, 0),
        (1, 35.8, 0),
        (0, 26.29667, 0),
        (47.35, 13.5, 13.5),
    ]]
    fillet(f11_edges, radius=F11_R)


solid = f3.part
